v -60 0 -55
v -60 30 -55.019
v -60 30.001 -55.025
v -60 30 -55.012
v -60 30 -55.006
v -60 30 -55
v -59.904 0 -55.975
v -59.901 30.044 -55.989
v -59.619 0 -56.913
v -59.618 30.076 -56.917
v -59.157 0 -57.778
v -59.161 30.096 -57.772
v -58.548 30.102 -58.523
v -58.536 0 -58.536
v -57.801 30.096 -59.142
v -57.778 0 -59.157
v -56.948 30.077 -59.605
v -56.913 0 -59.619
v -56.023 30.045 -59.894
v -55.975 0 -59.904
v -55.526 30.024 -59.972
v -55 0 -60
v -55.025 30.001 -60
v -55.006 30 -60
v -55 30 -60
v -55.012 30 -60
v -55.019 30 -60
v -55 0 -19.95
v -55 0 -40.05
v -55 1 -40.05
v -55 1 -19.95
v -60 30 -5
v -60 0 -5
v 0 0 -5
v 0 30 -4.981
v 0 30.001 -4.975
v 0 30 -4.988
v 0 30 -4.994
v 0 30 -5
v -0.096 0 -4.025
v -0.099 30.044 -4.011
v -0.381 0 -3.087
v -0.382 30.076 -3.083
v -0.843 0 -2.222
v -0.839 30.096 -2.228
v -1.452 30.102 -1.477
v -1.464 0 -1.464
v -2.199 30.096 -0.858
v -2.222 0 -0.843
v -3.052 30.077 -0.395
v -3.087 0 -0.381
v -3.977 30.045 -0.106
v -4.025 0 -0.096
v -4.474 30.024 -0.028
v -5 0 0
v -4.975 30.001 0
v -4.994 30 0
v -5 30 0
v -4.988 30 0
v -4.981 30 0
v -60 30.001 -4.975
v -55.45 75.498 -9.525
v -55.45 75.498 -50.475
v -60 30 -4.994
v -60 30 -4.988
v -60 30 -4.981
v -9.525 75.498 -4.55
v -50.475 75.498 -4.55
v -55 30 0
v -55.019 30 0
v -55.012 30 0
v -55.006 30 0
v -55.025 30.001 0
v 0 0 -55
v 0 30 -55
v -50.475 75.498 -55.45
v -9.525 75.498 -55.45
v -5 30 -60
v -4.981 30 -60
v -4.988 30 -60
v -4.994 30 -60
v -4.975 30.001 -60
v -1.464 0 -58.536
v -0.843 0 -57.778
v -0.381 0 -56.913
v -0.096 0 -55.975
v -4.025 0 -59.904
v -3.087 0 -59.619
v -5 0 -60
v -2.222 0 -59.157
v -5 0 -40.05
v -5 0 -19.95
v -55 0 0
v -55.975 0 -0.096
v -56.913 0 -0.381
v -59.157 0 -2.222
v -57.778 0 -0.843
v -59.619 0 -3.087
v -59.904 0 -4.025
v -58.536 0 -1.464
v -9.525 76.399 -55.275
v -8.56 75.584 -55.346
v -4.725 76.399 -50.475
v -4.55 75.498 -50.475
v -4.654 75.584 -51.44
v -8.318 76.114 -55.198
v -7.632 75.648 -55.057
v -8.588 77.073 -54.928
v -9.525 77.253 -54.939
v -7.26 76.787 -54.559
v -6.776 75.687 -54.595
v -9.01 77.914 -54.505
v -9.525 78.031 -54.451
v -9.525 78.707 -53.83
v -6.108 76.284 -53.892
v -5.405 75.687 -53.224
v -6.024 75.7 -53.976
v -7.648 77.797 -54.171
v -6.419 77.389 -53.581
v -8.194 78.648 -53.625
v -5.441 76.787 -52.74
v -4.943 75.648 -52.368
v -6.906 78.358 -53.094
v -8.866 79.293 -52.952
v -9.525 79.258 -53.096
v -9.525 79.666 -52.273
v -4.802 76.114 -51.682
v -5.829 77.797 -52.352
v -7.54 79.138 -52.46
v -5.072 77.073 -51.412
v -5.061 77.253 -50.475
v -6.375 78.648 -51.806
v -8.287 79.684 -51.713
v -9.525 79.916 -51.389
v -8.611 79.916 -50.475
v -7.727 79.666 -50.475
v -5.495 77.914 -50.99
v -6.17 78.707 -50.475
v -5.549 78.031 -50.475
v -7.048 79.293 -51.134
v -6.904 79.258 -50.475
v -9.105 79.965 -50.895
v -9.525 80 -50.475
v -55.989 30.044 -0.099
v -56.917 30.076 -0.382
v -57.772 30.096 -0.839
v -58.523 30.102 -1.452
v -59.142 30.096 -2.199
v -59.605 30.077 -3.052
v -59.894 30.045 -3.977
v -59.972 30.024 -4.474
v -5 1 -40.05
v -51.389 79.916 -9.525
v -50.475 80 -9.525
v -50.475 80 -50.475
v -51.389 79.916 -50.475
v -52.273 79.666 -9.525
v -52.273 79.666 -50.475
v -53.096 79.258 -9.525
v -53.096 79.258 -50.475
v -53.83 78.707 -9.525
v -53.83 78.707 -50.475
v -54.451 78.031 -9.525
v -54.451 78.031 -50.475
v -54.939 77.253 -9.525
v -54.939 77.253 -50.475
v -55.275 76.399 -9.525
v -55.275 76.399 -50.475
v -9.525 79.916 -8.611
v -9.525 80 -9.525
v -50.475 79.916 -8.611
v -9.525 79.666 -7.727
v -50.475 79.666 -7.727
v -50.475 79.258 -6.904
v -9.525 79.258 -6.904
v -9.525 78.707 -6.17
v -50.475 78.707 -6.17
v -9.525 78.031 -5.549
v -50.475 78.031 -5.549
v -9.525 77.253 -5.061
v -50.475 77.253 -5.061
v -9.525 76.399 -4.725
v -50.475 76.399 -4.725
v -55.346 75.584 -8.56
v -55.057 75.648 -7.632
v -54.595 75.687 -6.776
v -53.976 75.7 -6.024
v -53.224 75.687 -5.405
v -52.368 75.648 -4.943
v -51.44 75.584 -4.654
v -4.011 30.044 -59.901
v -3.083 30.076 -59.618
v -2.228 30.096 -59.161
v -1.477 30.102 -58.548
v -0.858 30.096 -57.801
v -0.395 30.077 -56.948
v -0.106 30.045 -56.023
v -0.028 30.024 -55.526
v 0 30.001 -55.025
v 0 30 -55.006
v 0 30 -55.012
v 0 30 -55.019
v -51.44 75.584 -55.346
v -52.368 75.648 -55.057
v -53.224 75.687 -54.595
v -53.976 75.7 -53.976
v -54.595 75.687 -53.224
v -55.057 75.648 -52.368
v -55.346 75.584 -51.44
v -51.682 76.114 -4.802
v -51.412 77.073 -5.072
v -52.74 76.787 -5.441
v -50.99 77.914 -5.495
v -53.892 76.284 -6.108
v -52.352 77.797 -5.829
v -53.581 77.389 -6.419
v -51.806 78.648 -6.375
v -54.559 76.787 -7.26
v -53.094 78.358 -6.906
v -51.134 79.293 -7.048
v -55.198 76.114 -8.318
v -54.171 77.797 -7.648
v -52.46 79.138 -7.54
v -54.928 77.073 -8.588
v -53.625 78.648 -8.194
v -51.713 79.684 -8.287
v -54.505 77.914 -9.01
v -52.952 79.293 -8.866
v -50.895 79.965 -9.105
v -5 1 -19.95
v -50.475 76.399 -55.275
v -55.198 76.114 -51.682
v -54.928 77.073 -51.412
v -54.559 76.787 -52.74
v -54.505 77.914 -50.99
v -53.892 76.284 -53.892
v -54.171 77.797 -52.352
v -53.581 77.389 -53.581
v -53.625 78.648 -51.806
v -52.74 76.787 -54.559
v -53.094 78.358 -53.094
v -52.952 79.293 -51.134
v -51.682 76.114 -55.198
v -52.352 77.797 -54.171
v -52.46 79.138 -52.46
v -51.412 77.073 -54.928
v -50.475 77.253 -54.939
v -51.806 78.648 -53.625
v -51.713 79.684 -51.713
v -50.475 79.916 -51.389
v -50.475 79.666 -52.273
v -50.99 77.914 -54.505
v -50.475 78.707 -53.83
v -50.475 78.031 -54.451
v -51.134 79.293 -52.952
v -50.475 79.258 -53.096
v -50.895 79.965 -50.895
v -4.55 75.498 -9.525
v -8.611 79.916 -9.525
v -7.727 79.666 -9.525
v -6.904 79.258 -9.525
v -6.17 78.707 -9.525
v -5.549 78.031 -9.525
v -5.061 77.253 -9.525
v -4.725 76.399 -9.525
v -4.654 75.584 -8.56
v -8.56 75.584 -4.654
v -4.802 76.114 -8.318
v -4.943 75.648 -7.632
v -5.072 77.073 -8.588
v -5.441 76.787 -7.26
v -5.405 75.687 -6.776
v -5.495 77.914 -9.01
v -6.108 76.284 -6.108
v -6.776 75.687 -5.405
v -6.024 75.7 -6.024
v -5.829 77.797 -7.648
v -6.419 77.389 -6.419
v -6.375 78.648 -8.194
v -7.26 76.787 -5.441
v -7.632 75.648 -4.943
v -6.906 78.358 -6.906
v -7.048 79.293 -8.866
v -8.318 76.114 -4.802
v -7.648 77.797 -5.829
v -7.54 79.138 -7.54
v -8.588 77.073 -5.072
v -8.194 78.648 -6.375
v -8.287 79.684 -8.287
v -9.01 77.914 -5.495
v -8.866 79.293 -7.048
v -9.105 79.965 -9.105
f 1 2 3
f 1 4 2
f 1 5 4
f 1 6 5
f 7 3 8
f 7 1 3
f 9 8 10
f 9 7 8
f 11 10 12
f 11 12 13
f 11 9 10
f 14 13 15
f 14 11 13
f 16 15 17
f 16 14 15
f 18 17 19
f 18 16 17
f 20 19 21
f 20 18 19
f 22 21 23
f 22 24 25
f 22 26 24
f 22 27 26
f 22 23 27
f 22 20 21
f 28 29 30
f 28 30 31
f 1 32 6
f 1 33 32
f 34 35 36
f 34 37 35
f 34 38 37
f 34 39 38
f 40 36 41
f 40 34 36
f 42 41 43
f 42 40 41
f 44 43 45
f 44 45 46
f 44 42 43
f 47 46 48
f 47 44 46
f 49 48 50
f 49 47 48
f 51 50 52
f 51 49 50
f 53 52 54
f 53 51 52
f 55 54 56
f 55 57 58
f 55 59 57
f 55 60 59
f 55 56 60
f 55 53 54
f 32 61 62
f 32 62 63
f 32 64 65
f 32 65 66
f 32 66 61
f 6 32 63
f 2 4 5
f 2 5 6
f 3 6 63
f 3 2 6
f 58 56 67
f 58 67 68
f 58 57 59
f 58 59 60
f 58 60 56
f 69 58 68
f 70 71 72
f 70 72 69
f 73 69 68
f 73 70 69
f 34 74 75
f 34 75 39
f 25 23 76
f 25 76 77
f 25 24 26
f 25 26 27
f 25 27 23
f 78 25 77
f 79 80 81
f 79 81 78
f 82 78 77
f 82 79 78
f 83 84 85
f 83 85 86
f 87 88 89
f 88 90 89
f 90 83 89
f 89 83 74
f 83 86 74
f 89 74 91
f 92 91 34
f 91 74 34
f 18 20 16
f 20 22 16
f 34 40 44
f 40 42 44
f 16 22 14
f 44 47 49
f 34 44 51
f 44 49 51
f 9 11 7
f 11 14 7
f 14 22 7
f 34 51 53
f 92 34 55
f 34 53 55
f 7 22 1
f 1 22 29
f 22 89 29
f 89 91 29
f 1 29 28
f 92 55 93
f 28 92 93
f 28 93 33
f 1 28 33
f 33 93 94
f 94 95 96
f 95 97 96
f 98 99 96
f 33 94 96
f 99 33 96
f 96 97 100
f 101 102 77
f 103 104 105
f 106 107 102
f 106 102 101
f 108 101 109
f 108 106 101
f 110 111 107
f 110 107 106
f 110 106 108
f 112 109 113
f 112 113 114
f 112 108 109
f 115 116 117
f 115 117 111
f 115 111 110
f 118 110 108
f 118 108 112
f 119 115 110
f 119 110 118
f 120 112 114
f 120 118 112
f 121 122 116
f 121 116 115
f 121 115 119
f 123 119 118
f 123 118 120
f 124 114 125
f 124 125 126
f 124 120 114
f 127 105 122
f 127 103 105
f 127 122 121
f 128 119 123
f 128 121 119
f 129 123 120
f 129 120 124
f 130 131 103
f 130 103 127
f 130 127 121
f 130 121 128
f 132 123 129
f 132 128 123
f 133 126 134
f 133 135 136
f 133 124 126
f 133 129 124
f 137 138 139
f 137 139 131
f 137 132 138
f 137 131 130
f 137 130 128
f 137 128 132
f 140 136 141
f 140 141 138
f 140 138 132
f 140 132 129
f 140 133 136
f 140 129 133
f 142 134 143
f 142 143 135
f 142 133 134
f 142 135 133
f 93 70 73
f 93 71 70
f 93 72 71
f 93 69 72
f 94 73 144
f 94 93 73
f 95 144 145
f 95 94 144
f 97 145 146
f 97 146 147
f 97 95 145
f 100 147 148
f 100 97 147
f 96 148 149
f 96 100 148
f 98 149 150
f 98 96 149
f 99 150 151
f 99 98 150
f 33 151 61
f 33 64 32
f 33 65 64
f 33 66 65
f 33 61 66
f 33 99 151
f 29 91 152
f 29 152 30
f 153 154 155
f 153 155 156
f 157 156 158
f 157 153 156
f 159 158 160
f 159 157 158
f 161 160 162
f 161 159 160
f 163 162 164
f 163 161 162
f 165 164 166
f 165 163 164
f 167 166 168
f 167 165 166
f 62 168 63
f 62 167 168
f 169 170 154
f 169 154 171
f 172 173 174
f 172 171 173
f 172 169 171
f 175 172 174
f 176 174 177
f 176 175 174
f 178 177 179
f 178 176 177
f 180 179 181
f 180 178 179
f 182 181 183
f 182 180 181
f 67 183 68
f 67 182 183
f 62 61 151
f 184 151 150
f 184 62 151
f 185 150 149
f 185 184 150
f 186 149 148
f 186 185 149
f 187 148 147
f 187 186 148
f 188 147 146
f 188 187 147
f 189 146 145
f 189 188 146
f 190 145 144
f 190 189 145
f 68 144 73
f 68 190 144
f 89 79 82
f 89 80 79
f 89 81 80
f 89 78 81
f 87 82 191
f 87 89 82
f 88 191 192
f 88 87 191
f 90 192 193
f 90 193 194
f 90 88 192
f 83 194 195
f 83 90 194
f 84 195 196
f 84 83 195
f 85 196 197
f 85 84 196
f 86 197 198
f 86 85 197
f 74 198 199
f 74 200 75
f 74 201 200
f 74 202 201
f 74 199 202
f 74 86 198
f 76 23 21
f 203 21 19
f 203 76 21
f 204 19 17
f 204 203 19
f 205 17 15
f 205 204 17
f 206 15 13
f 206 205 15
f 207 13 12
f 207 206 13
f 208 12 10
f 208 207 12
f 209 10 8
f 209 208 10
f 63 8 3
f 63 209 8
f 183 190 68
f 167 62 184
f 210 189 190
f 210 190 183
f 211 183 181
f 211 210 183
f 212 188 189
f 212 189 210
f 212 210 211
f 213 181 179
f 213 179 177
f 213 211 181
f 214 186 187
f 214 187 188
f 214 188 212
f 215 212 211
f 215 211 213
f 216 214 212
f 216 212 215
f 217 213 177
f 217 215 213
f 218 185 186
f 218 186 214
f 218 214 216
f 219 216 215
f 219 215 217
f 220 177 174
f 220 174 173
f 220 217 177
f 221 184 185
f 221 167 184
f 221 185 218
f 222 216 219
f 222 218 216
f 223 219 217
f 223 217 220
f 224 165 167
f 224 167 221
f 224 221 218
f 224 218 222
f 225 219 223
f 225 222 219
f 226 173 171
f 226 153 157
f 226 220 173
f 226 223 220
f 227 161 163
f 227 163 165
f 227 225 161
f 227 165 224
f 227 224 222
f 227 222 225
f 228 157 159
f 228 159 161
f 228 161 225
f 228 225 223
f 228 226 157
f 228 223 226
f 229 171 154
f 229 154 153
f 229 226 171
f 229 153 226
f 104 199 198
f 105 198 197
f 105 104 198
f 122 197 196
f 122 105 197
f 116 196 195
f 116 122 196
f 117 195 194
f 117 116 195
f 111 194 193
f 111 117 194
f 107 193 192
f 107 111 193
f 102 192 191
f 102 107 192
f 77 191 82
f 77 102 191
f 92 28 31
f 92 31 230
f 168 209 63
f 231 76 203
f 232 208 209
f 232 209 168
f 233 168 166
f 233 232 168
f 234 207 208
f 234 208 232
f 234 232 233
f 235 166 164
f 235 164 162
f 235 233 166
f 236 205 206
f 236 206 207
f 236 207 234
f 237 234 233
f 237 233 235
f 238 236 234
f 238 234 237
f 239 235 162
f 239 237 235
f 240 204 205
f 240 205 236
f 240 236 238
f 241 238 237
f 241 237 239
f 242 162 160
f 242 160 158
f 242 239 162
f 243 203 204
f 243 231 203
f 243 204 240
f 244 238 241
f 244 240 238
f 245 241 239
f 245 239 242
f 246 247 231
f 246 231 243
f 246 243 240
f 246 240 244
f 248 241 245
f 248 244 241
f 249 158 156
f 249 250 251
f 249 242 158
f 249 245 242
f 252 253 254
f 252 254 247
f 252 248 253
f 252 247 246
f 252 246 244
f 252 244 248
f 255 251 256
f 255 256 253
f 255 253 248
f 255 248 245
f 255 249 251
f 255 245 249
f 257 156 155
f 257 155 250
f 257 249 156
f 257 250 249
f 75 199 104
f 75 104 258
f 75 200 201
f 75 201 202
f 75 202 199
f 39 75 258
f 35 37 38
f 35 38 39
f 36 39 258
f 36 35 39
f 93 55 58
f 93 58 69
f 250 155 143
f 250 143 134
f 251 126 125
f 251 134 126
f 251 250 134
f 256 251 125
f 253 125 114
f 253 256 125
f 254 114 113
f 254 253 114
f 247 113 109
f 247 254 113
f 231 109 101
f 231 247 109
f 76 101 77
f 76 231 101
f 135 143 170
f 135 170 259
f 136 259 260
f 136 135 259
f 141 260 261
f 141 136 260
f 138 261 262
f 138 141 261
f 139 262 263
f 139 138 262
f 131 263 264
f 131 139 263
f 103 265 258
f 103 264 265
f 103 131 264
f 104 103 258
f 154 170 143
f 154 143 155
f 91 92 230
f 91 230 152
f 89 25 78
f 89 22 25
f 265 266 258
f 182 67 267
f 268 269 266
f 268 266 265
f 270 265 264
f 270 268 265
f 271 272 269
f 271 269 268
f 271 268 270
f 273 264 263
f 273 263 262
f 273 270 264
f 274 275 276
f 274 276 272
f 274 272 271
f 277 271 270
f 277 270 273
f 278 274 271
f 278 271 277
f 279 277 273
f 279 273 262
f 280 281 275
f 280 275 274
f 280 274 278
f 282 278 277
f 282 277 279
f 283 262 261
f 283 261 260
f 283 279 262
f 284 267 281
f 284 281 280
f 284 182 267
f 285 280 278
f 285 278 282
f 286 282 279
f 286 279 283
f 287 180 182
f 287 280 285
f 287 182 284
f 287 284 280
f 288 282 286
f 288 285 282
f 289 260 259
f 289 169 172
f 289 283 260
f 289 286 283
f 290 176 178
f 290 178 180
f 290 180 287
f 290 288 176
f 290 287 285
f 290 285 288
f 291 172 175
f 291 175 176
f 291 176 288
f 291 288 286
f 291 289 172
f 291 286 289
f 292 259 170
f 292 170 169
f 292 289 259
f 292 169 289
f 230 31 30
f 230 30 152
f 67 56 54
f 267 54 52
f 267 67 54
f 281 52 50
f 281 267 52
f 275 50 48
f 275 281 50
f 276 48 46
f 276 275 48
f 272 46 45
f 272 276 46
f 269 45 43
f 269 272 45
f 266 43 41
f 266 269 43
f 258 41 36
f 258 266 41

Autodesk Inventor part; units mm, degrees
ref_plane "YZ Plane" through (0, 0, 0) normal (1, 0, 0) x (0, 1, 0)
ref_plane "XZ Plane" through (0, 0, 0) normal (0, 1, 0) x (-1, 0, 0)
ref_plane "XY Plane" through (0, 0, 0) normal (0, 0, 1) x (1, 0, 0)
sketch "スケッチ1" plane through (0, 0, 0) normal (0, 1, 0) x (-1, 0, 0)
  line L0 (0, 0) -> (60, 0)
  line L1 (60, 0) -> (60, -60)
  line L2 (60, -60) -> (0, -60)
  line L3 (0, -60) -> (0, 0)
  dimension "d0" = 60
  dimension "d1" = 60
extrude "押し出し1" add sketch "スケッチ1" along normal blind 80
chamfer "面取り1" distance 5 distance2 50 1 edges at (0, 80, -30) measured on face at (-20, 80, -40)
chamfer "面取り2" distance 5 distance2 50 1 edges at (-60, 80, -30) measured on face at (-23.3333, 80, -40)
chamfer "面取り3" distance 5 distance2 50 1 edges at (-30, 80, -60) measured on face at (-21.6667, 80, -40)
chamfer "面取り4" distance 5 distance2 50 1 edges at (-30, 80, 0) measured on face at (-21.6667, 80, -18.3333)
fillet "フィレット1" radius 5 12 edges at (0, 15, -60) (-60, 15, -60) (-60, 15, 0) (0, 15, 0) (-57.5, 55, -2.5) (-57.5, 55, -57.5) (-55, 80, -30) (-30, 80, -5) (-5, 80, -30) (-30, 80, -55) (-2.5, 55, -2.5) (-2.5, 55, -57.5)
sketch "スケッチ2" plane through (0, 0, 0) normal (0, -1, 0) x (1, 0, 0)
  line L0 (-60, -55) -> (-60, -5) projected
  line L1 (-60, -30) -> (0, -30) construction
  line L2 (0, -5) -> (0, -55) projected
  line L3 (-55, -19.95) -> (-5, -19.95)
  line L4 (-5, -19.95) -> (-5, -40.05)
  line L5 (-5, -40.05) -> (-55, -40.05)
  line L6 (-55, -40.05) -> (-55, -19.95)
  line L7 (-55, -19.95) -> (-5, -40.05) construction
  line L8 (-5, -19.95) -> (-55, -40.05) construction
  point P0 (0, 0)
  point P1 (-30, -30)
  dimension "d17" = 50
  dimension "d18" = 20.1
extrude "押し出し2" cut sketch "スケッチ2" against normal blind 1
properties part number "raida-"
